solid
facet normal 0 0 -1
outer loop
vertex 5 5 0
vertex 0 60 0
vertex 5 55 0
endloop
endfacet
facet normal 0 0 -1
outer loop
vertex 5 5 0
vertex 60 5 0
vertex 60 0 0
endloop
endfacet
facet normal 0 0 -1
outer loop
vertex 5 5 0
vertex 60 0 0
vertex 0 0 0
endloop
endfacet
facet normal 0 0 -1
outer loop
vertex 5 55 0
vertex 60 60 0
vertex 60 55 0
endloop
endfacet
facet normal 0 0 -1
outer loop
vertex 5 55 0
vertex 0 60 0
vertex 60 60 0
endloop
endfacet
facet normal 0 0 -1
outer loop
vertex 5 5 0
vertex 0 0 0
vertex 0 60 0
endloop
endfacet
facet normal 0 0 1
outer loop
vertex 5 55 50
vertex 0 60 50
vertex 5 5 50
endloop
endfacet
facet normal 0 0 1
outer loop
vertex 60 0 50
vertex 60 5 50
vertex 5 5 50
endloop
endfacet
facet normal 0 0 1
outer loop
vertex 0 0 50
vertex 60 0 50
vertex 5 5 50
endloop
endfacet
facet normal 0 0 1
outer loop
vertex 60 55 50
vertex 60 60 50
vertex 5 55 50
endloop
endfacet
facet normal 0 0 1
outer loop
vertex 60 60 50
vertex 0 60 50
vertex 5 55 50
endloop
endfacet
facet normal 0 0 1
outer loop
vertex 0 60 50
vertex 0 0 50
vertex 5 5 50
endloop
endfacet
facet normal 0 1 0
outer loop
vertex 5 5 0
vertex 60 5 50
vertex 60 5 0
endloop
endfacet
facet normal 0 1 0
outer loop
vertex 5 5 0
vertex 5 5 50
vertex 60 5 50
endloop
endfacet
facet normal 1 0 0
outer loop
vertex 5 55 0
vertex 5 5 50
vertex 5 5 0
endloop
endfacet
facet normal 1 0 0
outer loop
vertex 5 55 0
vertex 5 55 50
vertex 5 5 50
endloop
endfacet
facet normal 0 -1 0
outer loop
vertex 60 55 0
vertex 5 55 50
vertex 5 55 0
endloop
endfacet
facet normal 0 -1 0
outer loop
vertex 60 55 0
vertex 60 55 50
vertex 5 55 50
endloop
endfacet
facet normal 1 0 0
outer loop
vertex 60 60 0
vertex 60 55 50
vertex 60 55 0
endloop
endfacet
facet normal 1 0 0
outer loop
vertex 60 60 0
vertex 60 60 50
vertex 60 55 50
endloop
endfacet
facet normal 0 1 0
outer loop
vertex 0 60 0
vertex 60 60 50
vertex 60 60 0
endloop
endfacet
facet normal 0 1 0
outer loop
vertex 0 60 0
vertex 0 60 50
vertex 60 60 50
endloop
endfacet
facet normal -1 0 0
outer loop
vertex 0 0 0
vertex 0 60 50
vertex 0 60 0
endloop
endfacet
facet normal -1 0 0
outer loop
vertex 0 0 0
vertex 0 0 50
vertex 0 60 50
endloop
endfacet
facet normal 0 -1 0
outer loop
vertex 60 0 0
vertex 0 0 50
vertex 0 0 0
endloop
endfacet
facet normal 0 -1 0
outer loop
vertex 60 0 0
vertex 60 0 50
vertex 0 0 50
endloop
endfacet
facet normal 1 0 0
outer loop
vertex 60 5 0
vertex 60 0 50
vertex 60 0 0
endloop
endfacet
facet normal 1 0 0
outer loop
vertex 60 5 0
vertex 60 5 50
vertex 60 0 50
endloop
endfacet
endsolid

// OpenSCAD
$fn = 32;

// ----------------------------------------------------------------------
// Structural section: channel 60 x 60 mm
// ----------------------------------------------------------------------

// --- parameters (mm) ---
sec_w = 60;               // channel width, X
sec_h = 60;               // channel height, Y
flange_t = 5;             // flange thickness
web_t = 5;                // web thickness
plate_t = 50;             // cut length, Z (extrusion height)

profile = [[0, 0], [60, 0], [60, 5], [5, 5], [5, 55], [60, 55], [60, 60], [0, 60]];  // primary outline, 8 points, counter clockwise

// --- the one profile operation ---
linear_extrude(height = plate_t) polygon(points = profile);
